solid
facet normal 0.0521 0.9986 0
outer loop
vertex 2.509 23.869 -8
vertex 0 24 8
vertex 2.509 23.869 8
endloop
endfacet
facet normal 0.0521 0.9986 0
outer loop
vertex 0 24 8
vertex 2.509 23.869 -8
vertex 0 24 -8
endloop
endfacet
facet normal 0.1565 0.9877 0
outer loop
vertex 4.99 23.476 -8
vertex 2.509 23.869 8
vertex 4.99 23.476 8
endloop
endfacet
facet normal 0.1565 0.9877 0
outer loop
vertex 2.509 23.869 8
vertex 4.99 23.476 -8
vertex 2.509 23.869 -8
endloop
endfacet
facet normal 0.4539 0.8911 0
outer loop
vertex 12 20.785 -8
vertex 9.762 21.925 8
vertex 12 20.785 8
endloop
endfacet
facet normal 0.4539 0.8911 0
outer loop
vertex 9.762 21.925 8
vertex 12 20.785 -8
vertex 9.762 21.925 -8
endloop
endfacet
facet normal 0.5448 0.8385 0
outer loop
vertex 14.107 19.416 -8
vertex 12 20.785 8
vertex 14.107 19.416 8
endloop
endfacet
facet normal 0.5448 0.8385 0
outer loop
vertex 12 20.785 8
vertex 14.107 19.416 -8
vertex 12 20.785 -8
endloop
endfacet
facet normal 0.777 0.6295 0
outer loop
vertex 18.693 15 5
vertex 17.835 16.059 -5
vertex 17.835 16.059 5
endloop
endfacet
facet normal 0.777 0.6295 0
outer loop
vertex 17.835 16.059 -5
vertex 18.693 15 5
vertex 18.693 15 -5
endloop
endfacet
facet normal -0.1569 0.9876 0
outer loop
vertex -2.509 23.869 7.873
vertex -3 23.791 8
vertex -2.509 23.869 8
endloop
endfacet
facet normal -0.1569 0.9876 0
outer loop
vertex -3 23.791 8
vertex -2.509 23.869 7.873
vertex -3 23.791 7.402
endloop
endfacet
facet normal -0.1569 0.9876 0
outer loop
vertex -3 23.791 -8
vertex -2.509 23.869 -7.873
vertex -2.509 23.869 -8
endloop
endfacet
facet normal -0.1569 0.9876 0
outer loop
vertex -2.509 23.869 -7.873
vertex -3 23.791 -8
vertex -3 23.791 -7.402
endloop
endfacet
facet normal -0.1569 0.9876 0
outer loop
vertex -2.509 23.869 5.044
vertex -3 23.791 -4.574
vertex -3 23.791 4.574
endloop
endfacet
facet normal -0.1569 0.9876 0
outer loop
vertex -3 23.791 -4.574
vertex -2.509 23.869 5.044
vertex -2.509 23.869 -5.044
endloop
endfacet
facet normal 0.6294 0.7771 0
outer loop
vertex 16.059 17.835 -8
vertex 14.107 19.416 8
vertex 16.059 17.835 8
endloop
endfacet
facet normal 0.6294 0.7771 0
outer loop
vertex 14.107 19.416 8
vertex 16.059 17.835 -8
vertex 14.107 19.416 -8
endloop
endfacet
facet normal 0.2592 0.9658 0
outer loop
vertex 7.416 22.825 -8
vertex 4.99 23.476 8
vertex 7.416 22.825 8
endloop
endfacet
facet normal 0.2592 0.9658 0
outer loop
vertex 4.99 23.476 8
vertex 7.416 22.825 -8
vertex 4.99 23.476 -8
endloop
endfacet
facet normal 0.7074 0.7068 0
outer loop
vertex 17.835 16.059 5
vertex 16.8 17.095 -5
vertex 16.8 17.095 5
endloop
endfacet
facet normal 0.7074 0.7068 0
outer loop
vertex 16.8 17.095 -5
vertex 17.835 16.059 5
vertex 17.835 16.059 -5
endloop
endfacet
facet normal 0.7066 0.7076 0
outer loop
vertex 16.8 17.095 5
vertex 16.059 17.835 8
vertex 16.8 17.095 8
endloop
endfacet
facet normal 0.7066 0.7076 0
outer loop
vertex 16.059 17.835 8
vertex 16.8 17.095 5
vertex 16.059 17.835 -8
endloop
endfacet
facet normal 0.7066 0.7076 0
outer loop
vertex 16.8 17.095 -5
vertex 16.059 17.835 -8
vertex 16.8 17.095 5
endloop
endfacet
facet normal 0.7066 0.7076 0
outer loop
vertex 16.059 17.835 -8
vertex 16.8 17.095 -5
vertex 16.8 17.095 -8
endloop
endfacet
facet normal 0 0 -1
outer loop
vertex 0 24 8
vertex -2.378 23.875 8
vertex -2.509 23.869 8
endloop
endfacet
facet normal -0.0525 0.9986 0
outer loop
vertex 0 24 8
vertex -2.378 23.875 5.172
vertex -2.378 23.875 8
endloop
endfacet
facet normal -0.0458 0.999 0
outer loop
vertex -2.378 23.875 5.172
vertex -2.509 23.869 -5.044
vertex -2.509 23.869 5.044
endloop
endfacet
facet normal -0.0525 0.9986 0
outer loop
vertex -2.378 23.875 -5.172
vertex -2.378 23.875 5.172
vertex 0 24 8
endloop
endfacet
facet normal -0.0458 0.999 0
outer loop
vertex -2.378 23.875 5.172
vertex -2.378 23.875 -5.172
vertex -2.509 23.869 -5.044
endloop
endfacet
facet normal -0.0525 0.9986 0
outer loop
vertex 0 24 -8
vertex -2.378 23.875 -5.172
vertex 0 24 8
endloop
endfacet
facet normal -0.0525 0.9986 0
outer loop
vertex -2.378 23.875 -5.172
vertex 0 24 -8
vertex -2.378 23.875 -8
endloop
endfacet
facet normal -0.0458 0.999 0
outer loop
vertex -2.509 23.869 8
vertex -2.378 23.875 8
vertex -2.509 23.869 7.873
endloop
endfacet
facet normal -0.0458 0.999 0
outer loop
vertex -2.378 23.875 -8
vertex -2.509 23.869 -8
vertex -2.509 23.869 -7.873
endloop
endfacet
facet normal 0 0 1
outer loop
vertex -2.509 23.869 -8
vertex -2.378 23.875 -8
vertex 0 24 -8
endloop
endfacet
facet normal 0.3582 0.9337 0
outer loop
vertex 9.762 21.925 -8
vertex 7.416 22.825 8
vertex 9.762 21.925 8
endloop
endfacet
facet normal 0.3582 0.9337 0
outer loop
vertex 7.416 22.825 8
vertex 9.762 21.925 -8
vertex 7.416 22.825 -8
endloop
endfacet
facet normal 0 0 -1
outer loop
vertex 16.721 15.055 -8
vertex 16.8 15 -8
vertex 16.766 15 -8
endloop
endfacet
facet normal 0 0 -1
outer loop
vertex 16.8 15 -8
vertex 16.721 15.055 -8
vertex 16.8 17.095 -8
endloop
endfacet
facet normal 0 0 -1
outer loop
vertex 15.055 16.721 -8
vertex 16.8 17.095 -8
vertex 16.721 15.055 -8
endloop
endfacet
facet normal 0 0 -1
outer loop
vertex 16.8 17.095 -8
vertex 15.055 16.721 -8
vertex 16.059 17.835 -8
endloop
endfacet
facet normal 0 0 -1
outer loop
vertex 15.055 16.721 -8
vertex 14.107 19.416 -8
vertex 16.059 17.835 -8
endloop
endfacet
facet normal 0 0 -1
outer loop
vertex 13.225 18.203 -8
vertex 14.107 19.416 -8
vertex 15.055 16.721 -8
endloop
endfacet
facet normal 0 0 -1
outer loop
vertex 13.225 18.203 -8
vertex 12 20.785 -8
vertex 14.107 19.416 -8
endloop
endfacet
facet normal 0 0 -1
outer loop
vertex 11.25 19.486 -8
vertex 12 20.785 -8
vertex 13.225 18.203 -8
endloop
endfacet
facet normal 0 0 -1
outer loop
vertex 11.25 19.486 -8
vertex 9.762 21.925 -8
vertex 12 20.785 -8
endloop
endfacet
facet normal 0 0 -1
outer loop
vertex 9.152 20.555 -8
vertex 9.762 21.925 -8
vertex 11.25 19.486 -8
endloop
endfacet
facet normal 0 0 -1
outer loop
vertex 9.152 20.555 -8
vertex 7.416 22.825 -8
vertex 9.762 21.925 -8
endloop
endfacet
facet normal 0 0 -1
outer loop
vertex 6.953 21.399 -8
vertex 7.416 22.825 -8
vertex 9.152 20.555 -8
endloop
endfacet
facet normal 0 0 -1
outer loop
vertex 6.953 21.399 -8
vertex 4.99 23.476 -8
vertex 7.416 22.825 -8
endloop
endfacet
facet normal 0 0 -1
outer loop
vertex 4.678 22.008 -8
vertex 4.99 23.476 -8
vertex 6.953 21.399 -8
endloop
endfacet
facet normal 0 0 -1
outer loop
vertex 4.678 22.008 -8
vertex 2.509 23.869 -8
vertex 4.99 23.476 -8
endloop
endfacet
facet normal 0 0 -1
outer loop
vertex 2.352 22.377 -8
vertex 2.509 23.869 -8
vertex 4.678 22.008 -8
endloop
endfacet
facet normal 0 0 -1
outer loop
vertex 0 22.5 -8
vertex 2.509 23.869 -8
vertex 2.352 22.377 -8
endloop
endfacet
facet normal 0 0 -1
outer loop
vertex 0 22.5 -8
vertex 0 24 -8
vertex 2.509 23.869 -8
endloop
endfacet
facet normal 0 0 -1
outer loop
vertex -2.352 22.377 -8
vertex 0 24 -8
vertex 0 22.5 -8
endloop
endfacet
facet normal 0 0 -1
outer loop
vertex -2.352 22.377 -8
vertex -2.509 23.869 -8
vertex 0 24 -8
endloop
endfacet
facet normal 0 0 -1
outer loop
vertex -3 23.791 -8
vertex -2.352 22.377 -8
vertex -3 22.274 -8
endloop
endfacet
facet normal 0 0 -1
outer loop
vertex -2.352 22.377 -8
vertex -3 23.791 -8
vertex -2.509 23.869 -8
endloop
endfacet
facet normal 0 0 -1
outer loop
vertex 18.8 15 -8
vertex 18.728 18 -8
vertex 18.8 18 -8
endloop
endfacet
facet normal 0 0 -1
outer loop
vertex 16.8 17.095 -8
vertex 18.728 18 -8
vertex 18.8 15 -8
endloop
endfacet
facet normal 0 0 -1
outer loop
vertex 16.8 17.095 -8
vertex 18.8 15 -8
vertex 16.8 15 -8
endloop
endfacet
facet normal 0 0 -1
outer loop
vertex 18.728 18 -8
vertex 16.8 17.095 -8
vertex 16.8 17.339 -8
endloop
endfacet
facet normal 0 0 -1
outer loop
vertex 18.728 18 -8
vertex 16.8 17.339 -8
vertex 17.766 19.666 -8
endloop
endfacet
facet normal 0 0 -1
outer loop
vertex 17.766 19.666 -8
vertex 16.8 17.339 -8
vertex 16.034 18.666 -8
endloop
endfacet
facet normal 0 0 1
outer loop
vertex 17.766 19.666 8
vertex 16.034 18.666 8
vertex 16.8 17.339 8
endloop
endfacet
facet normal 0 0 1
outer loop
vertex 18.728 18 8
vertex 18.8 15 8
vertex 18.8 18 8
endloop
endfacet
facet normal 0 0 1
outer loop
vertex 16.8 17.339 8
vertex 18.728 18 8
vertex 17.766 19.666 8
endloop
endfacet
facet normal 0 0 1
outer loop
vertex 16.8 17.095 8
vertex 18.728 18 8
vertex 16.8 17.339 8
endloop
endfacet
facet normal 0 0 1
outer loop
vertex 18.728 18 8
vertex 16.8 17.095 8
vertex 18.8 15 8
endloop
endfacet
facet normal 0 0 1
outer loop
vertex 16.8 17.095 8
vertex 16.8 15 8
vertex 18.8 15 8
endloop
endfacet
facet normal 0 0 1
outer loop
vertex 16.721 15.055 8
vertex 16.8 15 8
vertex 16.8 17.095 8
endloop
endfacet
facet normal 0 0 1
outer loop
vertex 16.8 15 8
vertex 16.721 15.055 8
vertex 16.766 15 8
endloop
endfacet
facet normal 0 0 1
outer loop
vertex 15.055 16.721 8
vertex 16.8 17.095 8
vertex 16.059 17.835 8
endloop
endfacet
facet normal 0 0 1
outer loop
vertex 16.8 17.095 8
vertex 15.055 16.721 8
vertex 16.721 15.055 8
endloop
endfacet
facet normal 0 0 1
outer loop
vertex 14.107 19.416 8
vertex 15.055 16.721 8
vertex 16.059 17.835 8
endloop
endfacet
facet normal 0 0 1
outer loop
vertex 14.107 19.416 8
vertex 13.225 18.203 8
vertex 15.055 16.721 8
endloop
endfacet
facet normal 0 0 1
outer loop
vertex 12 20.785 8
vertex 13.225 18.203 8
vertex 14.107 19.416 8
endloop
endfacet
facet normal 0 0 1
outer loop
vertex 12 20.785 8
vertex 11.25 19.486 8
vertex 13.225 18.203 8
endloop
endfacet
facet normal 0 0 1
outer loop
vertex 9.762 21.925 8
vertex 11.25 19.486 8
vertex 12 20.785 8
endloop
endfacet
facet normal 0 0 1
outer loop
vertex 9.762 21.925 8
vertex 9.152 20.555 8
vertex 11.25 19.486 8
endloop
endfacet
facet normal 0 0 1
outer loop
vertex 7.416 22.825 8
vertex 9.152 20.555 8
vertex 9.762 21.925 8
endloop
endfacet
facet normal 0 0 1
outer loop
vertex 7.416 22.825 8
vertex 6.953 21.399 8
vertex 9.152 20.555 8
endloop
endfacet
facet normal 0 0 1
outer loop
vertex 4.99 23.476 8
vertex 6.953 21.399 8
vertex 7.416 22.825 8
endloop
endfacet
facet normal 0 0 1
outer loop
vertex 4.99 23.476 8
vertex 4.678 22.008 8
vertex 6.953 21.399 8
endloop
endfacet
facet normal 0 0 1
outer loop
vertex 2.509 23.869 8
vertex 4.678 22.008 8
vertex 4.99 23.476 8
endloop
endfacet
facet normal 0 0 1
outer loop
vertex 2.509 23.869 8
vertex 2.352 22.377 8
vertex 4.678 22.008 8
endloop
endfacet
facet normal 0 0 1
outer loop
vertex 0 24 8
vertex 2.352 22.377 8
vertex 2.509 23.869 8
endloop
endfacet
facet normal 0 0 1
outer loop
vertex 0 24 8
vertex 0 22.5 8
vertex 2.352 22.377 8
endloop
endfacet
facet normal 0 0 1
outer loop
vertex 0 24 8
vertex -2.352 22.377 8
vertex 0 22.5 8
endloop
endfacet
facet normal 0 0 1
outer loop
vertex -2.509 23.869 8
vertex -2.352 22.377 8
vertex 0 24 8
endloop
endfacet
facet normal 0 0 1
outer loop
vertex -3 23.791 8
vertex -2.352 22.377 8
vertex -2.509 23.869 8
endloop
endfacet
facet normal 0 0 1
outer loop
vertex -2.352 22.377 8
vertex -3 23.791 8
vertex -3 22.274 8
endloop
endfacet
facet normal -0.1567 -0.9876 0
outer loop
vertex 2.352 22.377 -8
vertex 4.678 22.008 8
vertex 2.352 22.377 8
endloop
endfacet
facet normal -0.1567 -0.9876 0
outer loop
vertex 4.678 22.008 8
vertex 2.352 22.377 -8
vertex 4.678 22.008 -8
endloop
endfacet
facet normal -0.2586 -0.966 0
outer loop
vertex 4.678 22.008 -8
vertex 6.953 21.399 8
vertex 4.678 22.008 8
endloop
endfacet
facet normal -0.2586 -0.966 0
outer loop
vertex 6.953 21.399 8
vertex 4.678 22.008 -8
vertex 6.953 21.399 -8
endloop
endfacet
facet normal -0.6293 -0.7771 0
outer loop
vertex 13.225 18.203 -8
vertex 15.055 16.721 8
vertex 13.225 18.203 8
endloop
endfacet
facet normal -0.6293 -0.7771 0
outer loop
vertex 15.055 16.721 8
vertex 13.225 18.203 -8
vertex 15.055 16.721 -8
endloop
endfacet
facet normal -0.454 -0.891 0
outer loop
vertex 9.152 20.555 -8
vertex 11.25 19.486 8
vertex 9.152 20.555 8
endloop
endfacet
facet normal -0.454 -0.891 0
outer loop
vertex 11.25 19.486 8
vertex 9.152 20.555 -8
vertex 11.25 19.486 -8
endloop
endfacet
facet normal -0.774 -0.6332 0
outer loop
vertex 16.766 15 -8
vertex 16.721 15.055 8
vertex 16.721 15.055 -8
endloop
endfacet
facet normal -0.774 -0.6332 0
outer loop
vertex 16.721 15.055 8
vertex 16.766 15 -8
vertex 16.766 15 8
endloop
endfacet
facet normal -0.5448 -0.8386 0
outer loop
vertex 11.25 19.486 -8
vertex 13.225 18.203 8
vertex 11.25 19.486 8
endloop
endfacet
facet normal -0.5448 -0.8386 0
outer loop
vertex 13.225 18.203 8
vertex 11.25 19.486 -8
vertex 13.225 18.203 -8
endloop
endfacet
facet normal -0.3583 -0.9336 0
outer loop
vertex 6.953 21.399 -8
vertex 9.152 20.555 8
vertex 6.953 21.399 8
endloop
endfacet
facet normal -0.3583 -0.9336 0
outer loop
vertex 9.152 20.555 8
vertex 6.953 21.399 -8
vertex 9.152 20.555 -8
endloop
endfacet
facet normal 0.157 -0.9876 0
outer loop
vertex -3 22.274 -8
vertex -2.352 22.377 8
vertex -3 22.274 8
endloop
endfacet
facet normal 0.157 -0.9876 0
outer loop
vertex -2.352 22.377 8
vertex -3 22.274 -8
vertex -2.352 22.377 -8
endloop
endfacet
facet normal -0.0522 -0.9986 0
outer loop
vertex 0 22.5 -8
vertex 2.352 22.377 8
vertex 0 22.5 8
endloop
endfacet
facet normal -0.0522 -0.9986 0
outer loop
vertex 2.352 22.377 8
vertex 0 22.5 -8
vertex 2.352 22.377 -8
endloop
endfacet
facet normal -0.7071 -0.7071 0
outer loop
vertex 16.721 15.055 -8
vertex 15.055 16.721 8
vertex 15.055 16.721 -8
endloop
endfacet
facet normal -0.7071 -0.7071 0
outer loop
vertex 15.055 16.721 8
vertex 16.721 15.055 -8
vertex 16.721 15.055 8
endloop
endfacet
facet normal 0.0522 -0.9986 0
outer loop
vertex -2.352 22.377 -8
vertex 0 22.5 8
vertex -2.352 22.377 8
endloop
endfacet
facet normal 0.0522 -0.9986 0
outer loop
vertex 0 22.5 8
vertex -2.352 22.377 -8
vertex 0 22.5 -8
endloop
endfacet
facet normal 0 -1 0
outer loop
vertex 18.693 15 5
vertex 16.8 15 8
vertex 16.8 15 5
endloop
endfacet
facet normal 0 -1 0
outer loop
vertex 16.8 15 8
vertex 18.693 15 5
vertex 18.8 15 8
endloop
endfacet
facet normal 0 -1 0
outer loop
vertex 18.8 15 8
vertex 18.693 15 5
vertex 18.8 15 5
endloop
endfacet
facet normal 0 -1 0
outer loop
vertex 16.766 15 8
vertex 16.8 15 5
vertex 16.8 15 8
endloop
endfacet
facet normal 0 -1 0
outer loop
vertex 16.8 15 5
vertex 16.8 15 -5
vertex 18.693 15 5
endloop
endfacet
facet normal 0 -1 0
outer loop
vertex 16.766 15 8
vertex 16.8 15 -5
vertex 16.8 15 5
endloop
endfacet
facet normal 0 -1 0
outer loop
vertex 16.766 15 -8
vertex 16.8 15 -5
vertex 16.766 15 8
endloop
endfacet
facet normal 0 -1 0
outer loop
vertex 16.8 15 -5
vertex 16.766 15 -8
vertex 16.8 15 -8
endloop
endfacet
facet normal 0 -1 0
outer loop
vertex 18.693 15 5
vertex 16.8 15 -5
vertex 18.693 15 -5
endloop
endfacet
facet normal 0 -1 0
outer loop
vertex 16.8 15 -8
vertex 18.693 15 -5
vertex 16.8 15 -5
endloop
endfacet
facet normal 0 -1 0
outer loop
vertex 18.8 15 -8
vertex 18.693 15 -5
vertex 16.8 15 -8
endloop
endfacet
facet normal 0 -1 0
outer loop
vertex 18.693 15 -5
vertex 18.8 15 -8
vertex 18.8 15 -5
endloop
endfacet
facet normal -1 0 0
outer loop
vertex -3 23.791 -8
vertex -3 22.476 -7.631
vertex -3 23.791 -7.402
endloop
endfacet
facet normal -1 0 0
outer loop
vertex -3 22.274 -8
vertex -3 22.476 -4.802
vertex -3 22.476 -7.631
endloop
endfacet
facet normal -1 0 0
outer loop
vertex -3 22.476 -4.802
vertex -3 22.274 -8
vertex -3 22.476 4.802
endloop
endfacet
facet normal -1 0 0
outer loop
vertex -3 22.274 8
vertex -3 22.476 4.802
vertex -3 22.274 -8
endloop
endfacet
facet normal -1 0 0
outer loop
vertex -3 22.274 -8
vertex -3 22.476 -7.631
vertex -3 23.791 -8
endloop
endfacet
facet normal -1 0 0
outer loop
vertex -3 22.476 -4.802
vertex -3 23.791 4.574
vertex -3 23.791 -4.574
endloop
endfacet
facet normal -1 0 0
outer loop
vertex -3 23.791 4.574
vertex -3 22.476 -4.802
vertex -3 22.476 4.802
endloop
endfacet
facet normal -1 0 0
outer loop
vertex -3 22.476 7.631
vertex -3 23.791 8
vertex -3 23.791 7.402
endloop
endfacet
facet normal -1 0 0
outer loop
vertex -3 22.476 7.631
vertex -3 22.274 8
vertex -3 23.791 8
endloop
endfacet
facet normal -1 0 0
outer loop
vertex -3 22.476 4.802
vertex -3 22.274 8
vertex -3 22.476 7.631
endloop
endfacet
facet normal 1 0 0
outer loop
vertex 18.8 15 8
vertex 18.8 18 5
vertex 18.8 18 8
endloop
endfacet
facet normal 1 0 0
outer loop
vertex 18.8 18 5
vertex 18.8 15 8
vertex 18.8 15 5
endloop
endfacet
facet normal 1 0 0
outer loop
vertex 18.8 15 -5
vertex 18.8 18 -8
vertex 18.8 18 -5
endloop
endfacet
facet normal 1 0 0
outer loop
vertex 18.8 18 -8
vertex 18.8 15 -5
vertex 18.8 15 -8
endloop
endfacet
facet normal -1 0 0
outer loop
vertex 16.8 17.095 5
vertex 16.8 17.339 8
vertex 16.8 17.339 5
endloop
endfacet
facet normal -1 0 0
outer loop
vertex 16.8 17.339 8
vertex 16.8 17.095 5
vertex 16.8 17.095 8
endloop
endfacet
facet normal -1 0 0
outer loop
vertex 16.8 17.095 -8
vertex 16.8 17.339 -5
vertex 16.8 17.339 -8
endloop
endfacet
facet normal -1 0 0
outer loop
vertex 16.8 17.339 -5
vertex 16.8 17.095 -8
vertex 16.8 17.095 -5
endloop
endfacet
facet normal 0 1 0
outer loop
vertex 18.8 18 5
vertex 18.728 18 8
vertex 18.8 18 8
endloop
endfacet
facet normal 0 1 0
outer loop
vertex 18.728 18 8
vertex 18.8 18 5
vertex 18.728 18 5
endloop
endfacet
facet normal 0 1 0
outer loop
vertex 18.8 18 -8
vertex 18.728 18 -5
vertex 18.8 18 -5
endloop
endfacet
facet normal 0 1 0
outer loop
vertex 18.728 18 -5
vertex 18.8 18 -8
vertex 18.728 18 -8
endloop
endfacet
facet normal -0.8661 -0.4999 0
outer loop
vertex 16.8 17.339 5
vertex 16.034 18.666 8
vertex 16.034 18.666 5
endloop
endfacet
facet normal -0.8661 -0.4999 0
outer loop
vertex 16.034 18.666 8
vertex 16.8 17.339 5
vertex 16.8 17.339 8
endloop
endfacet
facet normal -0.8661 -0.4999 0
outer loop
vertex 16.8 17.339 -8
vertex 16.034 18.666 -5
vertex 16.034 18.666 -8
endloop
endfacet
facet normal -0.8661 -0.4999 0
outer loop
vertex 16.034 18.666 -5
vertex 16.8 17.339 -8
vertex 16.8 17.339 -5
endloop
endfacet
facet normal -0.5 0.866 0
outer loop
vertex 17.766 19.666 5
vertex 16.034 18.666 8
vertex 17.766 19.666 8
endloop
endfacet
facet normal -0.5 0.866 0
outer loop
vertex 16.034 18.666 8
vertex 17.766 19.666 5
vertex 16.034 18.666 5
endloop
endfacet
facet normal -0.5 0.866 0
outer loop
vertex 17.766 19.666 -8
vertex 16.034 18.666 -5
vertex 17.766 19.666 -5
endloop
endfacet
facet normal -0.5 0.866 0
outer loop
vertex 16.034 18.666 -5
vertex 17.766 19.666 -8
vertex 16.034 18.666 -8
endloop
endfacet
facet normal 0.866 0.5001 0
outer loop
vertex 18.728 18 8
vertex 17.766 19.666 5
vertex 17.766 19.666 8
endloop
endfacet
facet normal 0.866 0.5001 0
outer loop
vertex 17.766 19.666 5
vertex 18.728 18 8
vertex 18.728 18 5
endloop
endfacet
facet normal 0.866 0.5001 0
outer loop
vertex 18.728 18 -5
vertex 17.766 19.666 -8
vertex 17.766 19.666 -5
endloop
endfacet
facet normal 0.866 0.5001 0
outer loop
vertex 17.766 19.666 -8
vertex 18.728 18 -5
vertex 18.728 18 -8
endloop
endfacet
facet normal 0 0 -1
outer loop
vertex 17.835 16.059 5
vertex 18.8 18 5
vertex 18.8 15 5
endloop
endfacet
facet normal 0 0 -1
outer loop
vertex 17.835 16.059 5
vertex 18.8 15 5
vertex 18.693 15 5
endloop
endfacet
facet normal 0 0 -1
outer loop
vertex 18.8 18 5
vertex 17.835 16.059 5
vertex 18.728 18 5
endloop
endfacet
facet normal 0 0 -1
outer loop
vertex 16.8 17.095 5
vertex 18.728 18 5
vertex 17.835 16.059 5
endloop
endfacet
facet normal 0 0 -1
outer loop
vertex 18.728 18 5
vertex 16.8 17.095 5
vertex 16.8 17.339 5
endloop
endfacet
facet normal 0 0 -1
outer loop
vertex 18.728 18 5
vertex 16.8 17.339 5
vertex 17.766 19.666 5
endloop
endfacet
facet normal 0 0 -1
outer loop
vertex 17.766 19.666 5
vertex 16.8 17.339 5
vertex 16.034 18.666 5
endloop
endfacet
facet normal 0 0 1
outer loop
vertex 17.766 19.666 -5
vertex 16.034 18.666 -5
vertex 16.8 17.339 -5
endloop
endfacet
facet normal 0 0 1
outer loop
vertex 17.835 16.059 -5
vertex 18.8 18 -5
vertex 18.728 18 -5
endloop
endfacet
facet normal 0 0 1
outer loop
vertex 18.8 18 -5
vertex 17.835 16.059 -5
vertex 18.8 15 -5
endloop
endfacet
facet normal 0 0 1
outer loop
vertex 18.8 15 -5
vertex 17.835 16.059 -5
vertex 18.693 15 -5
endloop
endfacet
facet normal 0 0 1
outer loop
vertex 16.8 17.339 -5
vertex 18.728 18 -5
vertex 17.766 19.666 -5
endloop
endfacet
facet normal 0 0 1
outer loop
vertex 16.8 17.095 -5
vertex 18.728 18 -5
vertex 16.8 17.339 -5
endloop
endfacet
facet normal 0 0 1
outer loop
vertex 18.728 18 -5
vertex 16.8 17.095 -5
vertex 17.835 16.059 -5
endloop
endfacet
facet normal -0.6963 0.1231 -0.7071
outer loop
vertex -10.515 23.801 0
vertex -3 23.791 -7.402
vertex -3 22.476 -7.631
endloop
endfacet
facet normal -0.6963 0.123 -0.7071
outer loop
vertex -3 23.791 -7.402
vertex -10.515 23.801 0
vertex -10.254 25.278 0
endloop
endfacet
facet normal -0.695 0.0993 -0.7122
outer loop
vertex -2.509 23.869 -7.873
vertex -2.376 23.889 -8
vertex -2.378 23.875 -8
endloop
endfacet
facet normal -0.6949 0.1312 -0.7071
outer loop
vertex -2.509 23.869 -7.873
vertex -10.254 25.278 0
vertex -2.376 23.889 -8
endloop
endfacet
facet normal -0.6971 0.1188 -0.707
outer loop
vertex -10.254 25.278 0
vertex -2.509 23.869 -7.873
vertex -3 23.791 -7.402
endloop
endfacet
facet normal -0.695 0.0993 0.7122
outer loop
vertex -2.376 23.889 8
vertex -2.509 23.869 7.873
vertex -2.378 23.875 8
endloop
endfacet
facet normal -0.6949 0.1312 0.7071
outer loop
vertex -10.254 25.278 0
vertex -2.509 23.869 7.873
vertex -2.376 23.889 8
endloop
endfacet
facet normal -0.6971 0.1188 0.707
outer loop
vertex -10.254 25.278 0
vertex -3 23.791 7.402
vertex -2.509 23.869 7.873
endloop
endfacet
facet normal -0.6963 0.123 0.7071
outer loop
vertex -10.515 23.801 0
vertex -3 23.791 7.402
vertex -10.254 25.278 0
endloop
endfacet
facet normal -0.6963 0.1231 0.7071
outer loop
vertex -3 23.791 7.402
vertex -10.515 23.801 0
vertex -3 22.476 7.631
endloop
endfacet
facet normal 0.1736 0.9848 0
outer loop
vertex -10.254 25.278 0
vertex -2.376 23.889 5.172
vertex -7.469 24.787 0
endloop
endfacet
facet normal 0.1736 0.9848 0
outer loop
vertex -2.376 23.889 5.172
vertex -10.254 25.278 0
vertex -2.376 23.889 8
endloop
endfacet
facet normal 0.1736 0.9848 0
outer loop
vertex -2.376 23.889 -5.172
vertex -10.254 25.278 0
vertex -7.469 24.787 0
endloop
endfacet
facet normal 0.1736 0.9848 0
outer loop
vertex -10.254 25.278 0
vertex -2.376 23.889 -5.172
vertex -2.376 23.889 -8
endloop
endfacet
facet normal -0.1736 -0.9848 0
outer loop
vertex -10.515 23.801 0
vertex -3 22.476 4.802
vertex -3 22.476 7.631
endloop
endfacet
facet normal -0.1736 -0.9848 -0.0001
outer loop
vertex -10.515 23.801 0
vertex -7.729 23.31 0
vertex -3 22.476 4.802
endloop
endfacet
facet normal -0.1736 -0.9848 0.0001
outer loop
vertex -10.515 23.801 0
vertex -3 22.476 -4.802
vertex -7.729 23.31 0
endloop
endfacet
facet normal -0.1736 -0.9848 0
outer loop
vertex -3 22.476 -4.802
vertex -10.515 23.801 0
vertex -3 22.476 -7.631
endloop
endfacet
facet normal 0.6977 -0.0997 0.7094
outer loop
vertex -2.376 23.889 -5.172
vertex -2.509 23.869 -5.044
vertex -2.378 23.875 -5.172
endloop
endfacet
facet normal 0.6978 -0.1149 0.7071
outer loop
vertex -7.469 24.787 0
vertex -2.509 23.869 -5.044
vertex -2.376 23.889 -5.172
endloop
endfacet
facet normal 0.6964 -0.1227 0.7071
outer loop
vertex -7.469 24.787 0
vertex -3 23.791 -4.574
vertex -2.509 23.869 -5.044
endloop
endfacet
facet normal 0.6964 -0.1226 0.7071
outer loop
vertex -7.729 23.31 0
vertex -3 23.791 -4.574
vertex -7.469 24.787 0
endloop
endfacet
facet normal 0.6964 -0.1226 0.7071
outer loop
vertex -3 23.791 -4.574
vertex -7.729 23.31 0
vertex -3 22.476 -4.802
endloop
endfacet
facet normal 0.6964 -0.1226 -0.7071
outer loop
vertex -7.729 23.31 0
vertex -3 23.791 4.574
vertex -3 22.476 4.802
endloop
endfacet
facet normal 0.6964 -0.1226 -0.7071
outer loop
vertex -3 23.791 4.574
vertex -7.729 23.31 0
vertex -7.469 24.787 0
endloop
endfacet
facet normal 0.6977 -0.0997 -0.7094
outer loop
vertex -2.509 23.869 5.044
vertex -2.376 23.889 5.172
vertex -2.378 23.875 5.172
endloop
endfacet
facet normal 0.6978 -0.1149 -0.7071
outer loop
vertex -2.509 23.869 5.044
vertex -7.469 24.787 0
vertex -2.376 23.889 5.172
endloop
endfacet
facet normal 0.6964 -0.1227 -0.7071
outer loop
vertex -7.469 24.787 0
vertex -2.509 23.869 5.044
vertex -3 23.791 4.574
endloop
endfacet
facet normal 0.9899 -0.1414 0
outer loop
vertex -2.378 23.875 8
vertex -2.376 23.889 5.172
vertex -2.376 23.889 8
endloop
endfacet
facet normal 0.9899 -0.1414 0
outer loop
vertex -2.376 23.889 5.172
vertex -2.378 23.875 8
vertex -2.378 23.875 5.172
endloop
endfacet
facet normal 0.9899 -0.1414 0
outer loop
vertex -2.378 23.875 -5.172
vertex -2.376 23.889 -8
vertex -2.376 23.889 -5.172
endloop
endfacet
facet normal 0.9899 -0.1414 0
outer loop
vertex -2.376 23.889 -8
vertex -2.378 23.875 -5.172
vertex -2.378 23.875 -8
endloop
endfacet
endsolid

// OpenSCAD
// Piece of plastic to grab hold of the T-shaped metal bit that is 
// attached to the sprung reel for the actual cable to attach to.

$fn=60;

RING_HT = 16;


difference(){
    cylinder(h = RING_HT, r = 48/2, center = true);
    cylinder(h = RING_HT + 0.5, r = 45/2, center = true);

    translate([0, -10, 0]){
        cube([50, 50,20 ], center=true);
    }
    // #translate([18, 18, 0]){
    //     cube([15,10 , 10], center=true);
    // }

    translate([-18, 15, 0]){
        cube([30, 30,20 ], center=true);
    }
}



difference(){
    translate([17.8, 16.5, 0]){
        cube([2,3 ,RING_HT ], center=true);
        translate([-0.4, 1.8, 0]){
            rotate([0, 0, 30]){
                cube([2,2 ,RING_HT ], center=true);
            }
        }
    }
    translate([14, 18, 0]){
        cube([15,10 , 10], center=true);
    }
}


translate([-6.5, 0.5, 0]){
    rotate([0, 0, -10]){
        translate([0, 23, 0]){
            difference(){
                rotate([0, 45, 0]){
                    difference(){
                        cube([RING_HT * 1/sqrt(2), 1.5,RING_HT * 1/sqrt(2) ], center=true);
                        cube([RING_HT * 1/sqrt(2)-4, 1.6,RING_HT * 1/sqrt(2) -4], center=true);
                    }
                }
                translate([8,0,0]){
                    cube([RING_HT,2 ,RING_HT ], center=true);
                }
            }
        }
    }
    
}
